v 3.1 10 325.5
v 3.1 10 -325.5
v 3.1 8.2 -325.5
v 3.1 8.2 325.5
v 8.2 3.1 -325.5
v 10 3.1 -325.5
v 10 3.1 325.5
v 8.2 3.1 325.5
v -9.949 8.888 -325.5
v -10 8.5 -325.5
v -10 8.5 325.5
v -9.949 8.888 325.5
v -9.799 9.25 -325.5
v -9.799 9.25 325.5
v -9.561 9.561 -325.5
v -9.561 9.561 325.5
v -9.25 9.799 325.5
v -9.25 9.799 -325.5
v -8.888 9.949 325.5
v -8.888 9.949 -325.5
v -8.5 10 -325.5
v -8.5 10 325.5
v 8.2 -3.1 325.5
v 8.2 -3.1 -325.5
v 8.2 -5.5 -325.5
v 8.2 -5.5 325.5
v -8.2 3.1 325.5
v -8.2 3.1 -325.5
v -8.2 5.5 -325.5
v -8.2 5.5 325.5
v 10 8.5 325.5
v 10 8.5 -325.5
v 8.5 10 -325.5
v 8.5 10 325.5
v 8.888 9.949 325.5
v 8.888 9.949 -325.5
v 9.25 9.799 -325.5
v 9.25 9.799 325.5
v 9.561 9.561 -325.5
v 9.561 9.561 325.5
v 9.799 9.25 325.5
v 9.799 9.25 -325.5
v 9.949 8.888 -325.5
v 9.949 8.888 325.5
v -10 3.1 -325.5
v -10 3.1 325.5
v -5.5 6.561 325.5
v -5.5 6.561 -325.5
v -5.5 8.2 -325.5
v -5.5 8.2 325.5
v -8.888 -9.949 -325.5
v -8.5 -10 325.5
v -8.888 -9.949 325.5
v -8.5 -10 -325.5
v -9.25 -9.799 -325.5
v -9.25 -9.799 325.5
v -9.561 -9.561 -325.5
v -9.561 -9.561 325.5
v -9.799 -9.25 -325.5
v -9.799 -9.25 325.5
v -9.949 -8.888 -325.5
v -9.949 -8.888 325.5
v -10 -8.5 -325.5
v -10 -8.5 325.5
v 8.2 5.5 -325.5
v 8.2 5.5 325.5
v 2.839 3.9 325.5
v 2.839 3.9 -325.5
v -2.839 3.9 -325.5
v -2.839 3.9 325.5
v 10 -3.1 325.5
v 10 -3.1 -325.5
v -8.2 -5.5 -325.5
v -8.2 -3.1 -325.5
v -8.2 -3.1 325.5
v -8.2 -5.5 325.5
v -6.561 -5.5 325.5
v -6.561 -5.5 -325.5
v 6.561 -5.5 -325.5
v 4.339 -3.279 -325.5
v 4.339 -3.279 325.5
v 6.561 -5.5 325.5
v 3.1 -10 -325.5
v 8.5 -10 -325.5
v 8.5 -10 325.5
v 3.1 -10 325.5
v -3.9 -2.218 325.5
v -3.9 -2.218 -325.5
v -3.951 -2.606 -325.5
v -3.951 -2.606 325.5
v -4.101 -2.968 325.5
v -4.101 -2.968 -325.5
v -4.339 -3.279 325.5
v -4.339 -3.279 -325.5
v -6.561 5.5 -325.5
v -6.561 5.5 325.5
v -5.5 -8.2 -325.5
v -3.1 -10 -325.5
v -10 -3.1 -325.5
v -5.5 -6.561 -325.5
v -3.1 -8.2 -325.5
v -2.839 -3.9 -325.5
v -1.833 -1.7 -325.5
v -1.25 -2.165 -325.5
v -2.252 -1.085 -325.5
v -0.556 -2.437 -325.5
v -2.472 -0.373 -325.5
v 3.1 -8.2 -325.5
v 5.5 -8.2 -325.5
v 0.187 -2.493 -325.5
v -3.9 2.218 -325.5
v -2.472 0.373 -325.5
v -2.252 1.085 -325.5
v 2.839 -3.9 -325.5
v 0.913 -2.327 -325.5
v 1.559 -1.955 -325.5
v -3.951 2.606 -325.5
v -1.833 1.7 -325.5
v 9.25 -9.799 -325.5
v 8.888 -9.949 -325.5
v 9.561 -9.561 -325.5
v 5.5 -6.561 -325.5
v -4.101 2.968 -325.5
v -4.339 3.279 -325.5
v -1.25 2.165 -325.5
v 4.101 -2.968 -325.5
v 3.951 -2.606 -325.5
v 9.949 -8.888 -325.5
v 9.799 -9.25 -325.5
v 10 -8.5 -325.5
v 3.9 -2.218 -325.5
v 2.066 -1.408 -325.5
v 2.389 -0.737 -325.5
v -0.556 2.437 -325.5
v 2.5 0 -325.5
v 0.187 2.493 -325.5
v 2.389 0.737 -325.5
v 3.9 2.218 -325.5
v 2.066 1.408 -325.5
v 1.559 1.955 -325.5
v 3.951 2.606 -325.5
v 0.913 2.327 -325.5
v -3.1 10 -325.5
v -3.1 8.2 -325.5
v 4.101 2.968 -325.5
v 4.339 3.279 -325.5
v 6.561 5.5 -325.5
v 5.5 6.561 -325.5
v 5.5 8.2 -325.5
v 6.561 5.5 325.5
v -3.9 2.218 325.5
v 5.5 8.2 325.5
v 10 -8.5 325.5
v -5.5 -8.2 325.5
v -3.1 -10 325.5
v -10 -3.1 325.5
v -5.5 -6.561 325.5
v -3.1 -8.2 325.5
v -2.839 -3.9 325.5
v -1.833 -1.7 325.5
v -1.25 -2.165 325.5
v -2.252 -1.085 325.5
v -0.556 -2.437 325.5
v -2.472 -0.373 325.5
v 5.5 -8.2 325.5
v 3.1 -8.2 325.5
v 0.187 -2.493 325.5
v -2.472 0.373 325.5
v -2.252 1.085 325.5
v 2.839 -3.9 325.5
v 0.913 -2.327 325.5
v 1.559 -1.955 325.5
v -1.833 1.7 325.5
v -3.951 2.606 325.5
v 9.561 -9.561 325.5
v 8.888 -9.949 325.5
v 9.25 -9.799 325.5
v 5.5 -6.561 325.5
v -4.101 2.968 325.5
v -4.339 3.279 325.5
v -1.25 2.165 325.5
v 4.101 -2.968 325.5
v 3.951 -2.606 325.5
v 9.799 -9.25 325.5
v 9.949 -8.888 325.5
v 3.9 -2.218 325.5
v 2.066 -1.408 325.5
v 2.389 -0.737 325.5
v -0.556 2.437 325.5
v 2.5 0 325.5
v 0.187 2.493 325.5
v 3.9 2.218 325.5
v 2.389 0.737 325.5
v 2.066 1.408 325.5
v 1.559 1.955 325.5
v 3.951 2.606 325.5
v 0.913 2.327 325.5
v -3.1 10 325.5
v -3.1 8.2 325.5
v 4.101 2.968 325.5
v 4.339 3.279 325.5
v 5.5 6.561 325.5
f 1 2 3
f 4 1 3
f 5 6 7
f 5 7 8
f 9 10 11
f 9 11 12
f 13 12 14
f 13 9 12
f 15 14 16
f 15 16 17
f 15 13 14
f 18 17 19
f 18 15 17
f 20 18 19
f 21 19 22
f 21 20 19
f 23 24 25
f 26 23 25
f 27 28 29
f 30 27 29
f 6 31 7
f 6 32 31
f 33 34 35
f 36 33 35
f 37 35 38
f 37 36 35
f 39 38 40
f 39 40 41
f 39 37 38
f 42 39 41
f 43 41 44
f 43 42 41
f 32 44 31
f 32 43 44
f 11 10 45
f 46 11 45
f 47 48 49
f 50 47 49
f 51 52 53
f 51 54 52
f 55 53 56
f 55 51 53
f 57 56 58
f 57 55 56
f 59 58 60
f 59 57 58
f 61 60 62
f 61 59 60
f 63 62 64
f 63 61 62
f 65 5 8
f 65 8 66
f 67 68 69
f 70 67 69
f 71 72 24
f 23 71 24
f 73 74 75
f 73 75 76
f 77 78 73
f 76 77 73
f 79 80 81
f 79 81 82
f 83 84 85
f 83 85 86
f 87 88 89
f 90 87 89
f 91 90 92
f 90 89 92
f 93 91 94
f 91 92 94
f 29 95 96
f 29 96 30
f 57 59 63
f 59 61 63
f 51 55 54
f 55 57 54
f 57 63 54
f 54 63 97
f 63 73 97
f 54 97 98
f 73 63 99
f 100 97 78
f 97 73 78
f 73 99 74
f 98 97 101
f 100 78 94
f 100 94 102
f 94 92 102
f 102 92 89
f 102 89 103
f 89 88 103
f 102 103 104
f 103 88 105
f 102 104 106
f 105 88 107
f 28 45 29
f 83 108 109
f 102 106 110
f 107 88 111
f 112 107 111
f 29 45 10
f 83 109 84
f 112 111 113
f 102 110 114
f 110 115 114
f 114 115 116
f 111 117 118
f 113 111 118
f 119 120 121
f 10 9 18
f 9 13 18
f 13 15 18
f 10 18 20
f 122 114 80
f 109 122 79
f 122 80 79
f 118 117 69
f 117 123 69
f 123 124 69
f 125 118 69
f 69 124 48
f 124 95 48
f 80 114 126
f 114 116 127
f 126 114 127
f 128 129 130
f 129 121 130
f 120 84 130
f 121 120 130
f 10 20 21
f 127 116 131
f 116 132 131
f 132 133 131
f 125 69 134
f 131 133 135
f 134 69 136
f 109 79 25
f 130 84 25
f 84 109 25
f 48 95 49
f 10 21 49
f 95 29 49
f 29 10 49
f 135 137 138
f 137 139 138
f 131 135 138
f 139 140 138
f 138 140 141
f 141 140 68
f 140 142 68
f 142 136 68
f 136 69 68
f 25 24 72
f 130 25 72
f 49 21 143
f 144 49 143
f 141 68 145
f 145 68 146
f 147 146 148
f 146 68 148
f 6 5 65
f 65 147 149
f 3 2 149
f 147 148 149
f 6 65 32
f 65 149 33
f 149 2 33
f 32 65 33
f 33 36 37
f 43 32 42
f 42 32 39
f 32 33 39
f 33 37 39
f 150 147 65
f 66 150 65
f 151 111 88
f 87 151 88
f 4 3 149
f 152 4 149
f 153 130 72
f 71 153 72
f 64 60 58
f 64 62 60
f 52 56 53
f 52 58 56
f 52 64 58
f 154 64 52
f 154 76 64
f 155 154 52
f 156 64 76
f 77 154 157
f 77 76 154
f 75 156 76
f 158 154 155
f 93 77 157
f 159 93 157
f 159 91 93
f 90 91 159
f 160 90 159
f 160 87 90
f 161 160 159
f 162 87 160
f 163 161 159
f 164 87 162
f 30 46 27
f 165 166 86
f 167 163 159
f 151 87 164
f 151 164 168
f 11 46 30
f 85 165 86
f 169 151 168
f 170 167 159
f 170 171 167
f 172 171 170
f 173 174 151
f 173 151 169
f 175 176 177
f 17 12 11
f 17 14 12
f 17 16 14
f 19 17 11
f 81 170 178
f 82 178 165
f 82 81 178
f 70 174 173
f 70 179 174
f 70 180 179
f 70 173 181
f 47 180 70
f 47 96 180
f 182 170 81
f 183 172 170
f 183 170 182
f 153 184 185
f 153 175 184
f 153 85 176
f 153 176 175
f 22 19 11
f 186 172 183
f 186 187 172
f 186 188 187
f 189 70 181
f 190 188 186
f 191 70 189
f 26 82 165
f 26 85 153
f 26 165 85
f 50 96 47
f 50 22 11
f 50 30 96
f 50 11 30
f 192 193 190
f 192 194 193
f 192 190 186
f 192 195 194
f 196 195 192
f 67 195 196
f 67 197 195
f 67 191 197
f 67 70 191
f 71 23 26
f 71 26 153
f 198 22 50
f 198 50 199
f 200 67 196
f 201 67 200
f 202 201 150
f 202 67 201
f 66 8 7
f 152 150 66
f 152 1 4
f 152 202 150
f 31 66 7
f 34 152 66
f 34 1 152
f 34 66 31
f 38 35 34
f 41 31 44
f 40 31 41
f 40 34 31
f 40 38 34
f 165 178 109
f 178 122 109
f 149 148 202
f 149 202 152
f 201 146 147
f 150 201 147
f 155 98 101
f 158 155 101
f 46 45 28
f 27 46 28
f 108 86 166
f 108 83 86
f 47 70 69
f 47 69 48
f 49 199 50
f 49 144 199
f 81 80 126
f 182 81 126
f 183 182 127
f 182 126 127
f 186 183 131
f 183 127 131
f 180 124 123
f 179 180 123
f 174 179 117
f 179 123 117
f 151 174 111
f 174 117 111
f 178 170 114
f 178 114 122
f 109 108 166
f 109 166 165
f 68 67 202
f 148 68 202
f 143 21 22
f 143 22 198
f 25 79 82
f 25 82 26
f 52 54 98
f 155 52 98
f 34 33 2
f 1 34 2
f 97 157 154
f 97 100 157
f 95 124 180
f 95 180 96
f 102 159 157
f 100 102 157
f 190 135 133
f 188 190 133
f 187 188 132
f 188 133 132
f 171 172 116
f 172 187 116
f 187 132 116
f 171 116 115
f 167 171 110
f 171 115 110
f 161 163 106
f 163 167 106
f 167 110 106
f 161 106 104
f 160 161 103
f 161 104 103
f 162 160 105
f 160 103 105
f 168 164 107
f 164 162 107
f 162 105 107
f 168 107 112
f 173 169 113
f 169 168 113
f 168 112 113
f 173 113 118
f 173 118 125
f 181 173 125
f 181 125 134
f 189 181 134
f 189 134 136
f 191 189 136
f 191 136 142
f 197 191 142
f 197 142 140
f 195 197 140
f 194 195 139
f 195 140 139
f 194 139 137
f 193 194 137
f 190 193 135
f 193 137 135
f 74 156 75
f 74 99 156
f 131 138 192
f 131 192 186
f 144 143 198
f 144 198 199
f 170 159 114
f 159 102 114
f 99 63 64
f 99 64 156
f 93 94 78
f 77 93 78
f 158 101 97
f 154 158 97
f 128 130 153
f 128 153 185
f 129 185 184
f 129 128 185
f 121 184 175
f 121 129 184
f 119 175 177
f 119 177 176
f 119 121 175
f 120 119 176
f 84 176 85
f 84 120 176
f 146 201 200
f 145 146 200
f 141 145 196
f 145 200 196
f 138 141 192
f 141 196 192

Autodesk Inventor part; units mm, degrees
ref_plane "YZ Plane" through (0, 0, 0) normal (1, 0, 0) x (0, 1, 0)
ref_plane "XZ Plane" through (0, 0, 0) normal (0, 1, 0) x (-1, 0, 0)
ref_plane "XY Plane" through (0, 0, 0) normal (0, 0, 1) x (1, 0, 0)
sketch "Sketch1" plane through (0, 0, 0) normal (0, 0, 1) x (1, 0, 0)
  line L0 (-10, 10) -> (10, 10) construction
  line L1 (10, 10) -> (10, -10) construction
  line L2 (10, -10) -> (-10, -10) construction
  line L3 (-10, -10) -> (-10, 10) construction
  line L4 (0, 10) -> (0, -10) construction
  circle A0 centre (0, 0) radius 2.5
  line L5 (10, 0) -> (-10, 0) construction
  line L6 (0, 0) -> (10, 10) construction
  line L7 (-3.9, 3.9) -> (3.9, 3.9) construction
  line L8 (3.9, 3.9) -> (3.9, -3.9) construction
  line L9 (3.9, -3.9) -> (-3.9, -3.9) construction
  line L10 (-3.9, -3.9) -> (-3.9, 3.9) construction
  line L11 (2.8393, 3.9) -> (3.9, 2.8393) construction
  line L12 (10, 10) -> (5.5, 10) construction
  line L13 (5.5, 10) -> (5.5, 5.5) construction
  line L14 (5.5, 5.5) -> (10, 5.5) construction
  line L15 (10, 5.5) -> (10, 10) construction
  line L16 (3.9, 0) -> (3.9, 2.8393)
  line L17 (3.9, 2.8393) -> (6.5607, 5.5)
  line L18 (0, 3.9) -> (2.8393, 3.9)
  line L19 (2.8393, 3.9) -> (5.5, 6.5607)
  line L20 (10, 10) -> (10, 3.1)
  line L21 (10, 3.1) -> (8.2, 3.1)
  line L22 (8.2, 3.1) -> (8.2, 5.5)
  line L23 (6.5607, 5.5) -> (8.2, 5.5)
  line L24 (10, 10) -> (3.1, 10)
  line L25 (3.1, 10) -> (3.1, 8.2)
  line L26 (3.1, 8.2) -> (5.5, 8.2)
  line L27 (5.5, 6.5607) -> (5.5, 8.2)
  line L28 (-3.9, 0) -> (-3.9, 2.8393)
  line L29 (-3.9, 2.8393) -> (-6.5607, 5.5)
  line L30 (0, 3.9) -> (-2.8393, 3.9)
  line L31 (-2.8393, 3.9) -> (-5.5, 6.5607)
  line L32 (-10, 10) -> (-10, 3.1)
  line L33 (-10, 3.1) -> (-8.2, 3.1)
  line L34 (-8.2, 3.1) -> (-8.2, 5.5)
  line L35 (-6.5607, 5.5) -> (-8.2, 5.5)
  line L36 (-10, 10) -> (-3.1, 10)
  line L37 (-3.1, 10) -> (-3.1, 8.2)
  line L38 (-3.1, 8.2) -> (-5.5, 8.2)
  line L39 (-5.5, 6.5607) -> (-5.5, 8.2)
  line L40 (3.9, 0) -> (3.9, -2.8393)
  line L41 (3.9, -2.8393) -> (6.5607, -5.5)
  line L42 (0, -3.9) -> (2.8393, -3.9)
  line L43 (2.8393, -3.9) -> (5.5, -6.5607)
  line L44 (10, -10) -> (10, -3.1)
  line L45 (10, -3.1) -> (8.2, -3.1)
  line L46 (8.2, -3.1) -> (8.2, -5.5)
  line L47 (6.5607, -5.5) -> (8.2, -5.5)
  line L48 (10, -10) -> (3.1, -10)
  line L49 (3.1, -10) -> (3.1, -8.2)
  line L50 (3.1, -8.2) -> (5.5, -8.2)
  line L51 (5.5, -6.5607) -> (5.5, -8.2)
  line L52 (-3.9, 0) -> (-3.9, -2.8393)
  line L53 (-3.9, -2.8393) -> (-6.5607, -5.5)
  line L54 (-6.5607, -5.5) -> (-8.2, -5.5)
  line L55 (-8.2, -3.1) -> (-8.2, -5.5)
  line L56 (-10, -3.1) -> (-8.2, -3.1)
  line L57 (-10, -10) -> (-10, -3.1)
  line L58 (-10, -10) -> (-3.1, -10)
  line L59 (-3.1, -10) -> (-3.1, -8.2)
  line L60 (-3.1, -8.2) -> (-5.5, -8.2)
  line L61 (-5.5, -6.5607) -> (-5.5, -8.2)
  line L62 (-2.8393, -3.9) -> (-5.5, -6.5607)
  line L63 (0, -3.9) -> (-2.8393, -3.9)
  point P0 (0, 0)
  point P1 (0, 0)
  dimension "d8" = 20
  dimension "d9" = 20
  dimension "d10" = 5
  dimension "d18" = 6.1
  dimension "d19" = 6.1
  dimension "d21" = 1.5
  dimension "d24" = 4.5
  dimension "d25" = 4.5
  dimension "d26" = 1.5
  dimension "d27" = 6.9
  dimension "d28" = 1.8
extrude "Extrusion1" add sketch "Sketch1" along normal mid plane 651
fillet "Fillet1" radius 1.5 8 edges at (10, 10, 0) (-10, 10, 0) (10, -10, 0) (-10, -10, 0) (3.9, 2.8393, 0) (3.9, -2.8393, 0) (-3.9, 2.8393, 0) (-3.9, -2.8393, 0)
properties part number "perfil_2020T"
